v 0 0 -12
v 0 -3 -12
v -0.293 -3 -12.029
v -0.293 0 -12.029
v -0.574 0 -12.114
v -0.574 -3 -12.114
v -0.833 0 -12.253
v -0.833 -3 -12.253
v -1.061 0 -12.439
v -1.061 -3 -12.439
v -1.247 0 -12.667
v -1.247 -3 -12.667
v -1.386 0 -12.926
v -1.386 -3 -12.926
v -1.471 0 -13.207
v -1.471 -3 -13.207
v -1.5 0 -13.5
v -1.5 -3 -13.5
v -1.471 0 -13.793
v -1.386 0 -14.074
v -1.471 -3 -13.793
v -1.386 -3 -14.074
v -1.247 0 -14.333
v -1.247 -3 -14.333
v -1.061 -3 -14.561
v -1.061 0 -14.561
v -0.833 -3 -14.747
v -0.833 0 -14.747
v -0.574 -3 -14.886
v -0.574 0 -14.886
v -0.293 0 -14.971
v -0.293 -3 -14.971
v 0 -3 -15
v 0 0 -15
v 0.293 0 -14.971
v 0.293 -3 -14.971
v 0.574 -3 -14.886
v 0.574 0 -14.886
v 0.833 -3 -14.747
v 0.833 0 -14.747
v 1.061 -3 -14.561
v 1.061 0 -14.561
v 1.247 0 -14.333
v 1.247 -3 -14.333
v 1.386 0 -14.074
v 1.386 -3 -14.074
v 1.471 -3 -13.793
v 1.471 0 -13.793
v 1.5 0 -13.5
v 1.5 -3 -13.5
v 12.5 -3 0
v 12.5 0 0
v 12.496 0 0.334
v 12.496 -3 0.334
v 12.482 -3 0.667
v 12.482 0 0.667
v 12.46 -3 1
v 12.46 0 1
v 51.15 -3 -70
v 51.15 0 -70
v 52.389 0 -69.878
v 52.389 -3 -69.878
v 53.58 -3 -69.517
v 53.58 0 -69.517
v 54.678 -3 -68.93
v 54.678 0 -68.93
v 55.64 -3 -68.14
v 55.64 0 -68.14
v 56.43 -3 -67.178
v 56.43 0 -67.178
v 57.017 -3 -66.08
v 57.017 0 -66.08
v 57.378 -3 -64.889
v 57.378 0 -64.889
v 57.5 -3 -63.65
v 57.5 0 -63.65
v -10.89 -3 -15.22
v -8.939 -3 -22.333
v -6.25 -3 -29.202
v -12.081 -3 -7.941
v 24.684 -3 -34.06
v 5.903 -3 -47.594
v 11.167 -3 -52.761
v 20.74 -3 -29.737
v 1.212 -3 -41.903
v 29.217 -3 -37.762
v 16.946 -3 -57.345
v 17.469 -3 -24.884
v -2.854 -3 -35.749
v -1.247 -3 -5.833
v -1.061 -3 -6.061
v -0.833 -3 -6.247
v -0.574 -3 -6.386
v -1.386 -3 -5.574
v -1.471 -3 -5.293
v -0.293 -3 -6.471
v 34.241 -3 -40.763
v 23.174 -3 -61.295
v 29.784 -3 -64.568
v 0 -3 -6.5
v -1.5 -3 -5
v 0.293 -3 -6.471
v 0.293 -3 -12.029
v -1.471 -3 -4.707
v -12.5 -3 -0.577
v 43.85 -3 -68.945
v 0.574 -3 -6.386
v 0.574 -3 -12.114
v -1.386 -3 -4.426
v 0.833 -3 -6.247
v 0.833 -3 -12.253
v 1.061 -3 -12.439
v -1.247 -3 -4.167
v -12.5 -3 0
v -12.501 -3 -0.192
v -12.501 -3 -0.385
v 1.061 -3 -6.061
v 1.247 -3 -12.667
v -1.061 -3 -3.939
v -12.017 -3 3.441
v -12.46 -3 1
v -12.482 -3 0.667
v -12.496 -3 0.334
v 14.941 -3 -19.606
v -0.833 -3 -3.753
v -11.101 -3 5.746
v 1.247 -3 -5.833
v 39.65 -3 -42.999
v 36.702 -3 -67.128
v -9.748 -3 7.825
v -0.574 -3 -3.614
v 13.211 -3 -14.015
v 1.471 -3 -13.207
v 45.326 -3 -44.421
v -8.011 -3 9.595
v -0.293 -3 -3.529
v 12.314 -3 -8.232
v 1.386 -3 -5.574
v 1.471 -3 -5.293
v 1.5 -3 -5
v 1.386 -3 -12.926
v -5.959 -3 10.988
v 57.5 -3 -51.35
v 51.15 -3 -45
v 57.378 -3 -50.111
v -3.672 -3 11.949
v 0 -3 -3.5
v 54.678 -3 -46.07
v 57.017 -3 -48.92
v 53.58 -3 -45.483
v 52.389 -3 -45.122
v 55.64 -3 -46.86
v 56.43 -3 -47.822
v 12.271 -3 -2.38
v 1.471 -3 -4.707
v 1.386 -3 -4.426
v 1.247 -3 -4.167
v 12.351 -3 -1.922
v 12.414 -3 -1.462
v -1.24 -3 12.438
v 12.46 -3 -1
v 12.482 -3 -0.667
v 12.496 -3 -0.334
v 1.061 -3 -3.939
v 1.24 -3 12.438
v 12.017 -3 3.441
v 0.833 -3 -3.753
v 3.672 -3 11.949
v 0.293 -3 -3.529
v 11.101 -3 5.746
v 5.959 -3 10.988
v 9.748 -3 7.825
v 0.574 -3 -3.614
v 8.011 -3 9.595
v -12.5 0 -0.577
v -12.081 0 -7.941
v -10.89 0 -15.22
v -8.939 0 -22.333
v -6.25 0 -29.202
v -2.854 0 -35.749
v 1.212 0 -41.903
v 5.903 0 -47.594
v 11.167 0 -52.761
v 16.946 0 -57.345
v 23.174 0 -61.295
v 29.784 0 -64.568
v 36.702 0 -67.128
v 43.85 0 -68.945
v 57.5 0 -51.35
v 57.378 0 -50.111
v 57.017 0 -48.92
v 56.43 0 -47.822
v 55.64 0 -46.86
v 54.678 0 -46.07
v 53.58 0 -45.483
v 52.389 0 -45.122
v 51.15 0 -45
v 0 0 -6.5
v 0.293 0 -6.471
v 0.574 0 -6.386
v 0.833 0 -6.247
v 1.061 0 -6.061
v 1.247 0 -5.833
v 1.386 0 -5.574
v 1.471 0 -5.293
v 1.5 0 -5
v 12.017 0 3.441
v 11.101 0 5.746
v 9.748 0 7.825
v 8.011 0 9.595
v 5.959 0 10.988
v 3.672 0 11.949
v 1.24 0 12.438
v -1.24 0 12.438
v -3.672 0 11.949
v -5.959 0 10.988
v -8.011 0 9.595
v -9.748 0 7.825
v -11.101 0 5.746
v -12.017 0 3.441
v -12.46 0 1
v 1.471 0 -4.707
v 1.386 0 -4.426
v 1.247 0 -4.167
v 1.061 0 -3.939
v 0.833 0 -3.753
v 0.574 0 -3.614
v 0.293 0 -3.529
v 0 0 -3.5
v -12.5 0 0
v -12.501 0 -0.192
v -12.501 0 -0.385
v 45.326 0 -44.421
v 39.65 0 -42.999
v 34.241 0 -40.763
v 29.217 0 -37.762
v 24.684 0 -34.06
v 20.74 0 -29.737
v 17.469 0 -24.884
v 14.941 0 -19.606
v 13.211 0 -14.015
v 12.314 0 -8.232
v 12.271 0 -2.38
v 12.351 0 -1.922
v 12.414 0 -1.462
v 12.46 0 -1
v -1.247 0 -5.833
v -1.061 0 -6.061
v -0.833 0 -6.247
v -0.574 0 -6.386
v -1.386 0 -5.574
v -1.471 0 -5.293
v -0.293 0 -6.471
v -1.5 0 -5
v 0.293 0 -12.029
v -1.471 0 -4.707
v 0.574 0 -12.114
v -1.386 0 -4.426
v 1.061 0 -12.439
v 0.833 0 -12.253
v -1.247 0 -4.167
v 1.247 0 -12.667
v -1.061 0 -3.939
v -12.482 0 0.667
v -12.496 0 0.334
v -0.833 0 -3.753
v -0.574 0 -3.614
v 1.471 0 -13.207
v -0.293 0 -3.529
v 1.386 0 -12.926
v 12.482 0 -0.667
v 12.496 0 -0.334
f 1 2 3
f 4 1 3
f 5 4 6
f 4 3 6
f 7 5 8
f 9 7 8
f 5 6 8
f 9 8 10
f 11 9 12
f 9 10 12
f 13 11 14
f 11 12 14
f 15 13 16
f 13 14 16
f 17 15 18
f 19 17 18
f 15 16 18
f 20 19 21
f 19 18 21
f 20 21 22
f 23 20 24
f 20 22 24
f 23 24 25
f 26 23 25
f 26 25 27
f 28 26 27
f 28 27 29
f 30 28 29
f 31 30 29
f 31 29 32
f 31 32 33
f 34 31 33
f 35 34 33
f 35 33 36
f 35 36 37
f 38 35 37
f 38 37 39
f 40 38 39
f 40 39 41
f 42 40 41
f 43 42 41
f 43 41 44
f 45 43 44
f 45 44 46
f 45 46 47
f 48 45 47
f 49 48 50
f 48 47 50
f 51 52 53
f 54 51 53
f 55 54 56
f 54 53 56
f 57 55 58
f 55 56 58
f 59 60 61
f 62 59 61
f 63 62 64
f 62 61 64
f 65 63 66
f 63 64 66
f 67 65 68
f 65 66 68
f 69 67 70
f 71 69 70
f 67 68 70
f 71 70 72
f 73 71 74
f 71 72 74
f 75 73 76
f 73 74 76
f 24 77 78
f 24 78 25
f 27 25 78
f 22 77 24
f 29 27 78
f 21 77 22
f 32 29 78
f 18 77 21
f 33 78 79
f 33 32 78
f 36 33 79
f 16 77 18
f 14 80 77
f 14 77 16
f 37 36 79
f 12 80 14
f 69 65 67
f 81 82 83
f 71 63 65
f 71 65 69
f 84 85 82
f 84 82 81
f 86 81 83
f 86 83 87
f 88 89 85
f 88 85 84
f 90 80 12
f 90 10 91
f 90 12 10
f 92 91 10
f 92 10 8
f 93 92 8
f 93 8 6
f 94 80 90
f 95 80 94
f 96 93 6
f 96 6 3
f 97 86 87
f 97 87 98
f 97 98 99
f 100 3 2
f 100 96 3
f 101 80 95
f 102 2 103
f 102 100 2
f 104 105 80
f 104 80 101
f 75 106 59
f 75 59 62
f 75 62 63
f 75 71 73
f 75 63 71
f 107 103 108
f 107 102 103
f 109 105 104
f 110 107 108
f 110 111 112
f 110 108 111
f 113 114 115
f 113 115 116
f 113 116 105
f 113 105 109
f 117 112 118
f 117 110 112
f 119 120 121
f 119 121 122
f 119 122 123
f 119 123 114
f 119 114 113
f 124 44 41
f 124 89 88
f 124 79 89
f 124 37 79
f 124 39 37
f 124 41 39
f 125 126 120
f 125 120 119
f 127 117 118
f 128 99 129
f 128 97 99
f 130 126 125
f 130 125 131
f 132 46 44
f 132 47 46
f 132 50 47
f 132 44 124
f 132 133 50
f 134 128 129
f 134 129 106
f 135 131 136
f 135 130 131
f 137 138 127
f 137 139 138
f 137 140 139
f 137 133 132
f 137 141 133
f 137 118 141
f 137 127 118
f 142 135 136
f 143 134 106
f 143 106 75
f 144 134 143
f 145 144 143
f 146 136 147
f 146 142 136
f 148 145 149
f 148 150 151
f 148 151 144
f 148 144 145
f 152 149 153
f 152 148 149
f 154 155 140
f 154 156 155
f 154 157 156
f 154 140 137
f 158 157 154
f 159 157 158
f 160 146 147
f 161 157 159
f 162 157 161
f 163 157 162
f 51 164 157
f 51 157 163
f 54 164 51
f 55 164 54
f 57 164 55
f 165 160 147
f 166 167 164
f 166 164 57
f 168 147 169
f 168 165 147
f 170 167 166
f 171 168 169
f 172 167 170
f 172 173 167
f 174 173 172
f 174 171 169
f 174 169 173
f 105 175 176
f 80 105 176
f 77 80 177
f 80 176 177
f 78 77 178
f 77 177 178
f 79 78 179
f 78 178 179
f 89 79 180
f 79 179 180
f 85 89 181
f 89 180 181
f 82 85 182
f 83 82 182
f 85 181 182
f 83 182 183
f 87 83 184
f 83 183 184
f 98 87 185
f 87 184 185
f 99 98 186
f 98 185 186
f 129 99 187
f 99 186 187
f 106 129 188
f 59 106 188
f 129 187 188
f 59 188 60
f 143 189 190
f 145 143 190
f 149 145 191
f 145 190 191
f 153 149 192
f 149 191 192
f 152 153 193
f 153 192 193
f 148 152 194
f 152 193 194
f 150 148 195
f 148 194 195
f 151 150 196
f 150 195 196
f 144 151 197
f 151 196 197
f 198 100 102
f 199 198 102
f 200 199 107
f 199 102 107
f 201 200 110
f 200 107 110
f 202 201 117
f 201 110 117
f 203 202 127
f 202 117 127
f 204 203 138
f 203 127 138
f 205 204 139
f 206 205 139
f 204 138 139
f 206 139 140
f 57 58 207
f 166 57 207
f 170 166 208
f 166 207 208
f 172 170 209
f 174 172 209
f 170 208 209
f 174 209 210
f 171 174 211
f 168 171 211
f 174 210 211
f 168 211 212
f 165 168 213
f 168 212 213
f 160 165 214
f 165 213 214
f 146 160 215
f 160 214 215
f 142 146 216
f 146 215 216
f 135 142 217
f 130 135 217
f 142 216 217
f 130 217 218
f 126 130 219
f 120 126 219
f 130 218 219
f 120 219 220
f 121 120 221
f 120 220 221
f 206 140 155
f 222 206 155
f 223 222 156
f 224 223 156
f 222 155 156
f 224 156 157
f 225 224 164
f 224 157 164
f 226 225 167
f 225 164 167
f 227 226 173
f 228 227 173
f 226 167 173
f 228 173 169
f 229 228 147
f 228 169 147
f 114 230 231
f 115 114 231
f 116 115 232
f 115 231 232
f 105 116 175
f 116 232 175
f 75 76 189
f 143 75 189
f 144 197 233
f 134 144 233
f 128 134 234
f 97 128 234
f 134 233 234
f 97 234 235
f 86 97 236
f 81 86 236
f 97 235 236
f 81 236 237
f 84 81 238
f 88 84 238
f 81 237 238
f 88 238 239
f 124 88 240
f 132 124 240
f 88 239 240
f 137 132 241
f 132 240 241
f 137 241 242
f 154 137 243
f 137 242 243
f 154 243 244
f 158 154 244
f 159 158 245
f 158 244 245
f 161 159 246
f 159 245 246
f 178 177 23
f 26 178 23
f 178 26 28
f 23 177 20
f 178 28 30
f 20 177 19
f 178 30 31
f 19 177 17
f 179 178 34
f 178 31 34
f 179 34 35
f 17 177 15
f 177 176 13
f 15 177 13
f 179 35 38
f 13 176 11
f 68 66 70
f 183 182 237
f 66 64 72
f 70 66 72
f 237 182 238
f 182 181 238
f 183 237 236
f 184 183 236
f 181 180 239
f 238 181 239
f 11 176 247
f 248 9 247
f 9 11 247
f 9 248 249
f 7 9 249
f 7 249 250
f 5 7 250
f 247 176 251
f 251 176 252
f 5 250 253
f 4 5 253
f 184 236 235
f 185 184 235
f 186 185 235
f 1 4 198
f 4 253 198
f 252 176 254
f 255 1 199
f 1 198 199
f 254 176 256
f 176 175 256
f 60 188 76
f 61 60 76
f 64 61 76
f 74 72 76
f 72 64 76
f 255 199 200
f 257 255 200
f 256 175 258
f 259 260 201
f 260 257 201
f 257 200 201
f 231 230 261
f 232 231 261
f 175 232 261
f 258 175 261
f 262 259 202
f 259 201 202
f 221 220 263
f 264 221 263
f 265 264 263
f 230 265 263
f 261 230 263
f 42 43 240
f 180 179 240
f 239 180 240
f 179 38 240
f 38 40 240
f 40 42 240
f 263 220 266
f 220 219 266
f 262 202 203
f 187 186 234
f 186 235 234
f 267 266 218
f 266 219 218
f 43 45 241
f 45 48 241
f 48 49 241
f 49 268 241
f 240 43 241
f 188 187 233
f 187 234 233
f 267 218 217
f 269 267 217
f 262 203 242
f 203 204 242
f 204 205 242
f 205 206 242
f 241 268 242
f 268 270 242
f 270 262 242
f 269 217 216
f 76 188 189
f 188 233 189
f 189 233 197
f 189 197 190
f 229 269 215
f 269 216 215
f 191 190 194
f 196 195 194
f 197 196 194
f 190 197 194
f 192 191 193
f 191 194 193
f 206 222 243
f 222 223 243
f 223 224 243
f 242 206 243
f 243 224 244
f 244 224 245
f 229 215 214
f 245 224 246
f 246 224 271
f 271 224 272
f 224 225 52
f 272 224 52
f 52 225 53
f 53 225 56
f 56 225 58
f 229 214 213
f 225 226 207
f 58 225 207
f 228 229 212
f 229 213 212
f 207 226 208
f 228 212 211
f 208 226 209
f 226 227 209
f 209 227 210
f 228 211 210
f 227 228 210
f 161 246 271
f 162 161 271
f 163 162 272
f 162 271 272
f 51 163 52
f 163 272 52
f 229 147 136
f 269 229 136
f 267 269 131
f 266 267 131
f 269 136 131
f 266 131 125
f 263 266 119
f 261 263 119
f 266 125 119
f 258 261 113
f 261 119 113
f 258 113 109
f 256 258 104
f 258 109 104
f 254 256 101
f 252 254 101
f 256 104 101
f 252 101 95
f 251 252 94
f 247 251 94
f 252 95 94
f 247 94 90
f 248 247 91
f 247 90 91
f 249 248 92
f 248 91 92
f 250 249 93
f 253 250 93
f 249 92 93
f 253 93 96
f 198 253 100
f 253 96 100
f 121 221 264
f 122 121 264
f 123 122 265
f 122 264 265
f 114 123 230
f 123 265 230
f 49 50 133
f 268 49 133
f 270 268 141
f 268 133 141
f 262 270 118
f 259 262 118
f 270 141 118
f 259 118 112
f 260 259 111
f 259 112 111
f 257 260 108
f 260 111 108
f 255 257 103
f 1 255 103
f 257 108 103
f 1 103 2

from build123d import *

# Parameters (mm, degrees)
F0_R     = 1.5
F1_DEPTH = 3
F3_DEPTH = 381


with BuildPart() as f1:
    # F0 (on Front) → F1 (new body)
    with BuildSketch(Plane.XZ):
        with BuildLine():
            ThreePointArc((12.4599357944, -0.3280291537), (12.4796291372, -0.163973202), (12.5, 0))
            ThreePointArc((12.5, 0), (12.4899799325, 0.5004011242), (12.4599357944, 1))
            Line((12.4599357944, 1), (12.4599357944, -0.3280291537))
        make_face()
        with BuildLine():
            ThreePointArc((12.4599357944, -1), (12.4899799325, -0.5004011242), (12.5, 0))
            ThreePointArc((12.5, 0), (12.4796291372, -0.163973202), (12.4599357944, -0.3280291537))
            Line((12.4599357944, -0.3280291537), (12.4599357944, -1))
        make_face()
        with BuildLine():
            Line((12.4599357944, -0.3280291537), (12.4599357944, 1))
            ThreePointArc((12.4599357944, 1), (0, 12.5), (-12.4599357944, 1))
            Line((-12.4599357944, 1), (-12.4599357944, -1))
            ThreePointArc((-12.4599357944, -1), (-0.696307501, -12.4805911664), (12.2713731569, -2.3797900839))
            ThreePointArc((12.2713731569, -2.3797900839), (12.3524414608, -1.3526953053), (12.4599357944, -0.3280291537))
        make_face()
        Circle(F0_R, mode=Mode.SUBTRACT)
        with BuildLine():
            ThreePointArc((12.2713731569, -2.3797900839), (12.3848845687, -1.6925230338), (12.4599357944, -1))
            Line((12.4599357944, -1), (12.4599357944, -0.3280291537))
            ThreePointArc((12.4599357944, -0.3280291537), (12.3524414608, -1.3526953053), (12.2713731569, -2.3797900839))
        make_face()
        with BuildLine():
            Line((-12.4599357944, -1), (-12.4599357944, 1))
            ThreePointArc((-12.4599357944, 1), (-12.4899799325, 0.5004011242), (-12.5, 0))
            ThreePointArc((-12.5, 0), (-12.4899799325, -0.5004011242), (-12.4599357944, -1))
        make_face()
        with BuildLine():
            ThreePointArc((51.15, -45), (22.6329157643, -31.9707379741), (12.2713731569, -2.3797900839))
            ThreePointArc((12.2713731569, -2.3797900839), (-0.696307501, -12.4805911664), (-12.4599357944, -1))
            ThreePointArc((-12.4599357944, -1), (-12.4899799325, -0.5004011242), (-12.5, 0))
            Line((-12.5, 0), (-12.5, -0.5771173286))
            ThreePointArc((-12.5, -0.5771173286), (5.9031905044, -47.5942731711), (51.15, -70))
            ThreePointArc((51.15, -70), (55.6401280605, -68.1401280605), (57.5, -63.65))
            Line((57.5, -63.65), (57.5, -51.35))
            ThreePointArc((57.5, -51.35), (55.6401280605, -46.8598719395), (51.15, -45))
        make_face()
        with BuildLine():
            Line((-12.5, -0.5771173286), (-12.5, 0))
            ThreePointArc((-12.5, 0), (-12.5005947604, -0.2885586643), (-12.5, -0.5771173286))
        make_face()
        Circle(F0_R)
    extrude(amount=F1_DEPTH)

    # F2 (on face) → F3 (cut, symmetric)
    with BuildSketch(Plane.XZ.offset(3)):
        with BuildLine():
            ThreePointArc((1.5, -5), (1.0606601718, -3.9393398282), (0, -3.5))
            Line((0, -3.5), (0, -5))
            Line((0, -5), (0, -6.5))
            ThreePointArc((0, -6.5), (1.0606601718, -6.0606601718), (1.5, -5))
        make_face()
        with BuildLine():
            ThreePointArc((1.5, -13.5), (1.0606601718, -12.4393398282), (0, -12))
            ThreePointArc((0, -12), (-1.0606601718, -14.5606601718), (1.5, -13.5))
        make_face()
        with BuildLine():
            Line((0, -5), (0, -3.5))
            ThreePointArc((0, -3.5), (-1.5, -5), (0, -6.5))
            Line((0, -6.5), (0, -5))
        make_face()
    extrude(amount=F3_DEPTH, both=True, mode=Mode.SUBTRACT)


solid = f1.part
